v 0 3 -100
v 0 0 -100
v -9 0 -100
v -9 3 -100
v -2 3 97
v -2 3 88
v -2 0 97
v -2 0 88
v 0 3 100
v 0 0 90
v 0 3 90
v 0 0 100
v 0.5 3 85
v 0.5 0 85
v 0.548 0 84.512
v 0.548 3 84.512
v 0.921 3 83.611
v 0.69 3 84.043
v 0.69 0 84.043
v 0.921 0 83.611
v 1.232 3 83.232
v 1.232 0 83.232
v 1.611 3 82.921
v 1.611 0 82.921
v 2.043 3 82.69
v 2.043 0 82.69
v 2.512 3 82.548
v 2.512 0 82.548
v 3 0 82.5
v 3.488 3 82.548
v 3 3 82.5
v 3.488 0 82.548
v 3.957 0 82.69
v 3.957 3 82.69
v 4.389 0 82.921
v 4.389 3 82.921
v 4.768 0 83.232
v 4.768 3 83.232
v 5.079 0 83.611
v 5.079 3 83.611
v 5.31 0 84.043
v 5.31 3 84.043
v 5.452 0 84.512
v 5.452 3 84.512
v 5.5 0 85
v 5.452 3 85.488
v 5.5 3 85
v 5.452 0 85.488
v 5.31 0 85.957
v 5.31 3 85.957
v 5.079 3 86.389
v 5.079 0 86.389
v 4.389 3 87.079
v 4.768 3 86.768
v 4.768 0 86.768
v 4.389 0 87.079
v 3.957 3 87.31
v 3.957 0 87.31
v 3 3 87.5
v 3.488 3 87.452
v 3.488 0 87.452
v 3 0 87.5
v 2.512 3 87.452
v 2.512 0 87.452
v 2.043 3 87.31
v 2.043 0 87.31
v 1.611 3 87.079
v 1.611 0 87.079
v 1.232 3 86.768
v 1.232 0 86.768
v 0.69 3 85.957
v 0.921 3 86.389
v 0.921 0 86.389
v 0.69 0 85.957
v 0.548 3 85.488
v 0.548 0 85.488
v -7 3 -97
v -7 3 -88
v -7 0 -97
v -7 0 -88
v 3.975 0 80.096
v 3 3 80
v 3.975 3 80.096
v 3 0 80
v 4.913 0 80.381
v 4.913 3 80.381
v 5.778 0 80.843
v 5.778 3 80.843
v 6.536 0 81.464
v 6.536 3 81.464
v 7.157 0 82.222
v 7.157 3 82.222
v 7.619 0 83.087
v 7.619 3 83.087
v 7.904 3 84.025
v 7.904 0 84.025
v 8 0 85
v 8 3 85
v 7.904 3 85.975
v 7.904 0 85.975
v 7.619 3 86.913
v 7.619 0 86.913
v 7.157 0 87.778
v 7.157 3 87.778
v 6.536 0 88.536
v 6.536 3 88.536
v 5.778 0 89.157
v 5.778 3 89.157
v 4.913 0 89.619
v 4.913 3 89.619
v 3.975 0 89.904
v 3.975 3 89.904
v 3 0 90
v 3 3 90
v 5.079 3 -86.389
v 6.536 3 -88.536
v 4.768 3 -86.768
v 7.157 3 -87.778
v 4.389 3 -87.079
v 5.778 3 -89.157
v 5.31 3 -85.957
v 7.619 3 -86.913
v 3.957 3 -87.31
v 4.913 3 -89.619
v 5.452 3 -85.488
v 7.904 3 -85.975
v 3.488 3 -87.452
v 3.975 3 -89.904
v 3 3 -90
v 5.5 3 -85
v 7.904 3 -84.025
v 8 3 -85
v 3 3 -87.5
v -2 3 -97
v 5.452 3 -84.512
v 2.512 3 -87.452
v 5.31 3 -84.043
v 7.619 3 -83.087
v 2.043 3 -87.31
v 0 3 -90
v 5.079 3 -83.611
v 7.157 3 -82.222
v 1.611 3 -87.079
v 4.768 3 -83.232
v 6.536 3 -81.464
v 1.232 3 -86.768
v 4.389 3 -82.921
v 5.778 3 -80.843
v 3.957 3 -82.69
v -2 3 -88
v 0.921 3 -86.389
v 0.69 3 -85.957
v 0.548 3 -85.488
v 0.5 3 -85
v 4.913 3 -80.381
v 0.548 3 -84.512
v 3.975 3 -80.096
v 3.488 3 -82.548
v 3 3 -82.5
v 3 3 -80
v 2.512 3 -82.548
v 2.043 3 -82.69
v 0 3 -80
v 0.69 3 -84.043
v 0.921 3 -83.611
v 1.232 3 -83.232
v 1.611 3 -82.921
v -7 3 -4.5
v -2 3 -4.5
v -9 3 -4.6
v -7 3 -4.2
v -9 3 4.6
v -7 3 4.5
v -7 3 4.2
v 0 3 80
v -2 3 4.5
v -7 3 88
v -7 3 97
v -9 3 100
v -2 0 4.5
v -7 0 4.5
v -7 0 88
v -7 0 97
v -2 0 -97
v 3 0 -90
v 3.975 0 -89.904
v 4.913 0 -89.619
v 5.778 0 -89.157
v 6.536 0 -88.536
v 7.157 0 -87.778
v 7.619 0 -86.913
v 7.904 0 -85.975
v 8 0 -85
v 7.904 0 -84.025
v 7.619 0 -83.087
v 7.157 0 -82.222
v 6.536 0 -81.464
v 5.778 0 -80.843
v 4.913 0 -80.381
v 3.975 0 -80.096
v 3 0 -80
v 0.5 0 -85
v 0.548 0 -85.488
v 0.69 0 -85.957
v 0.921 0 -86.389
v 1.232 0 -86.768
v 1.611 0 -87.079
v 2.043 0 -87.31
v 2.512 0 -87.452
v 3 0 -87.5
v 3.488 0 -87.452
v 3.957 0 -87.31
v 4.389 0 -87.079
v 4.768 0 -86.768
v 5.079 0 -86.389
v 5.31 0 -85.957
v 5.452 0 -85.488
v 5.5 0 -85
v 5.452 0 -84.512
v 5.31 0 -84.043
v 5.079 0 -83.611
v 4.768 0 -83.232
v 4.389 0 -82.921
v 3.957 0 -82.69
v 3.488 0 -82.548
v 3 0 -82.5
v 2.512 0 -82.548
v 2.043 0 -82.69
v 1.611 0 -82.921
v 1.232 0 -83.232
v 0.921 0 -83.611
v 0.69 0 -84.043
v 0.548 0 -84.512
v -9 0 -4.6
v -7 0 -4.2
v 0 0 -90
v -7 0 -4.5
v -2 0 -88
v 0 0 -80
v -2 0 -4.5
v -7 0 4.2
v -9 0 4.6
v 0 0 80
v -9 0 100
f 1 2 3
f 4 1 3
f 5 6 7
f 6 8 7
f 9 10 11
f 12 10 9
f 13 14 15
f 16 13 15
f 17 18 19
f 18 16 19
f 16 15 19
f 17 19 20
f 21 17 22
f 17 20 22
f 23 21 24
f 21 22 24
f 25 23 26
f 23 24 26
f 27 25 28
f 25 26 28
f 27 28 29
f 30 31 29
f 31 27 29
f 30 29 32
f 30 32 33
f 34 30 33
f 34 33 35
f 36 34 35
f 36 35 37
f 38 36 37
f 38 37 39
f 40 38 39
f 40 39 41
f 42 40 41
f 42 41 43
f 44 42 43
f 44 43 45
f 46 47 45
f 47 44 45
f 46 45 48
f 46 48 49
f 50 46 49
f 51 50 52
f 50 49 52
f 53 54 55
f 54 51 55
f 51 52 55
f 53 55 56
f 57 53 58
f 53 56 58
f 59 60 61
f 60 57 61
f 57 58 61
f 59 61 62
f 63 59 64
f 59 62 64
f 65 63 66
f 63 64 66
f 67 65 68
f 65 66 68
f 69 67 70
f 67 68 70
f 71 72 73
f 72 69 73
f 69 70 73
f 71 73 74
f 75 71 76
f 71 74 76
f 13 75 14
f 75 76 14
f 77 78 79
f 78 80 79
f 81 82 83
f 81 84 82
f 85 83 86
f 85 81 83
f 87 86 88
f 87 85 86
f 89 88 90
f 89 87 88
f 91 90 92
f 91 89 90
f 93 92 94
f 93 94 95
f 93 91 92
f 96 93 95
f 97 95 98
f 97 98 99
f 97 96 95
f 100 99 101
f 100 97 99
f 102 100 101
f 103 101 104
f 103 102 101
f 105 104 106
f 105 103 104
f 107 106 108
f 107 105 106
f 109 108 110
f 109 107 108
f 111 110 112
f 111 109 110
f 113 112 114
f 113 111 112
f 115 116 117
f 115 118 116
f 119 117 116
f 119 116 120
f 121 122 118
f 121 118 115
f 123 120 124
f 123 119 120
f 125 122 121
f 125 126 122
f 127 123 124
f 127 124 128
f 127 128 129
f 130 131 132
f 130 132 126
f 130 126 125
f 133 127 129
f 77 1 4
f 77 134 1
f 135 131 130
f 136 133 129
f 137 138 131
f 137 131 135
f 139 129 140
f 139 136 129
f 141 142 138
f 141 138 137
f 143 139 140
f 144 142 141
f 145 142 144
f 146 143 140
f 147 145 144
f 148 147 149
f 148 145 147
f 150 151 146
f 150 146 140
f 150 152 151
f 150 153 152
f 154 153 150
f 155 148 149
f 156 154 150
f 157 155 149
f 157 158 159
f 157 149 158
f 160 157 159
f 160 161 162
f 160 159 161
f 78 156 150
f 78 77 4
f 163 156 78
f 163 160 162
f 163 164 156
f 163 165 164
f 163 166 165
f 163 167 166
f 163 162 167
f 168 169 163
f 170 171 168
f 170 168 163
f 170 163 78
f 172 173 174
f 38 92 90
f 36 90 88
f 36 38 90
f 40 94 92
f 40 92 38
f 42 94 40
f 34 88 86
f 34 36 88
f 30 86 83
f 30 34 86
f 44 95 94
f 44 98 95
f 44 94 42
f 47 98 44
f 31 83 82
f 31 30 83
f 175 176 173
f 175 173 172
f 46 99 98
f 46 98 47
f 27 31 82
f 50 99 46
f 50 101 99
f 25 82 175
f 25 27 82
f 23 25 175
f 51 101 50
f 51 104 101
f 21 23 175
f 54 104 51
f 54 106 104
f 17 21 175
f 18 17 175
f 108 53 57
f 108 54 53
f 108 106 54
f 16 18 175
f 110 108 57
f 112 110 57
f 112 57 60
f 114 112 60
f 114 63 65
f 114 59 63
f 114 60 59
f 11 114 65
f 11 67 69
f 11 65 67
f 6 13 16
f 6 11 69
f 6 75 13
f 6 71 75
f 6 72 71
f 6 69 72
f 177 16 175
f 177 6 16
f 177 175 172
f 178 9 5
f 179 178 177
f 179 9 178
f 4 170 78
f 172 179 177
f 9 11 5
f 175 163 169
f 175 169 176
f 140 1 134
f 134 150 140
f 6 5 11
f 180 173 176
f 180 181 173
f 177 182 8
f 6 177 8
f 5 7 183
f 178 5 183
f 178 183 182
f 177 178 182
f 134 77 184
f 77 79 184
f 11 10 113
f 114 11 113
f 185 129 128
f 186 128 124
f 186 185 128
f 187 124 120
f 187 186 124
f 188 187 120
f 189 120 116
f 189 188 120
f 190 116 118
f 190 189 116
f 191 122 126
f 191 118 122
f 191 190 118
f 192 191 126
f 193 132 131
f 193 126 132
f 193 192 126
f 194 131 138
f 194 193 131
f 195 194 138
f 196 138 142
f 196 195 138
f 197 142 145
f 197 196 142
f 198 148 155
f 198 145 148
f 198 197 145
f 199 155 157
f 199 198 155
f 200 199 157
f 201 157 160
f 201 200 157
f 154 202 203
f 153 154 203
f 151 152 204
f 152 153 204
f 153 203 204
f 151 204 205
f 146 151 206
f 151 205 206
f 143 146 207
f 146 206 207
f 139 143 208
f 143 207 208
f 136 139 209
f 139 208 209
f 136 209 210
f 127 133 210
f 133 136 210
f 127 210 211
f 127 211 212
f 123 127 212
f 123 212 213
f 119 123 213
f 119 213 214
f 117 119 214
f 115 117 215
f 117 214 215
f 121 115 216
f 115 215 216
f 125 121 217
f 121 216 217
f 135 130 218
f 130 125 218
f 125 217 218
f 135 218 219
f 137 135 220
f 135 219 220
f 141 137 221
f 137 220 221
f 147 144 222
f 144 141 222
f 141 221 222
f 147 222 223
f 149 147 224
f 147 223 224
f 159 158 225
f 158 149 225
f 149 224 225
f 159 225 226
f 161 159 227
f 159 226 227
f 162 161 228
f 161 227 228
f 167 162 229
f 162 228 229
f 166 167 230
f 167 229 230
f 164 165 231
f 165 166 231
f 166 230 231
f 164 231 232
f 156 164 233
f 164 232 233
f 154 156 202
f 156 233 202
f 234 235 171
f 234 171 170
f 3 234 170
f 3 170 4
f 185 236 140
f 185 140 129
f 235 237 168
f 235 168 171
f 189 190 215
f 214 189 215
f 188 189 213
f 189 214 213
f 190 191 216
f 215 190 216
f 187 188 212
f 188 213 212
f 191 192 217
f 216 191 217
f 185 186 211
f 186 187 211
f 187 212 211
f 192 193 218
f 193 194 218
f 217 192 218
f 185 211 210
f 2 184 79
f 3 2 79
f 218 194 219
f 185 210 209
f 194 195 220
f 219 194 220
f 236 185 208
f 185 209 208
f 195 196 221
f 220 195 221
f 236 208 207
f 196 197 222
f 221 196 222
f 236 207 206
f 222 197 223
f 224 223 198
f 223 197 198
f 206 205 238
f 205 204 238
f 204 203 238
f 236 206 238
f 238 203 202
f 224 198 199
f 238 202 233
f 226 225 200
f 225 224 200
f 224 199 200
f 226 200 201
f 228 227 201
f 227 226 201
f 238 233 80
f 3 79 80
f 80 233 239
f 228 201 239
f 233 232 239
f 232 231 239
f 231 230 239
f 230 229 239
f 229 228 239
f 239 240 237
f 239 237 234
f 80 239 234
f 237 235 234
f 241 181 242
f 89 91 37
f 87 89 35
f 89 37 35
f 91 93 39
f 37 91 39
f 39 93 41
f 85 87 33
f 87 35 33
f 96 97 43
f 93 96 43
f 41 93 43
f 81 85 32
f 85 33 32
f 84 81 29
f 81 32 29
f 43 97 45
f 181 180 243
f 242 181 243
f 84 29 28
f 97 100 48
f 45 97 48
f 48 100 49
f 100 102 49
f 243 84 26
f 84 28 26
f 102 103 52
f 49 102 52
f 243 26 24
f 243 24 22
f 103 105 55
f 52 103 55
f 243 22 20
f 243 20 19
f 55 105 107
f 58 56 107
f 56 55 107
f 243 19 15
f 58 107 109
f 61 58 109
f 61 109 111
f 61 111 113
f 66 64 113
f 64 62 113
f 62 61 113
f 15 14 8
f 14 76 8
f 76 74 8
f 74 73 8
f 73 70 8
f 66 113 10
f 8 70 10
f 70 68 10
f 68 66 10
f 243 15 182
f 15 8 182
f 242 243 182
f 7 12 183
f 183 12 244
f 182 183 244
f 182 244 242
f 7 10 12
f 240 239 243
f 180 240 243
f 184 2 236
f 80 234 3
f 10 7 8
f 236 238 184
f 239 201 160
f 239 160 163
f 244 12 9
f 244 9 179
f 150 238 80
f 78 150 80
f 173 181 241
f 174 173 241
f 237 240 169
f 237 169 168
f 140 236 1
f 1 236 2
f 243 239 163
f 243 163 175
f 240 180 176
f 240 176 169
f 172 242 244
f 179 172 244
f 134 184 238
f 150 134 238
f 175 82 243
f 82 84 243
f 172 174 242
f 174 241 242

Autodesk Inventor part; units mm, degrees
ref_plane "YZ Plane" through (0, 0, 0) normal (1, 0, 0) x (0, 1, 0)
ref_plane "XZ Plane" through (0, 0, 0) normal (0, 1, 0) x (-1, 0, 0)
ref_plane "XY Plane" through (0, 0, 0) normal (0, 0, 1) x (1, 0, 0)
sketch "草圖1" plane through (0, 0, 0) normal (0, 1, 0) x (-1, 0, 0)
  line L0 (0, 80) -> (9, 80)
  line L1 (9, -80) -> (0, -80)
  line L2 (0, -80) -> (0, 80)
  line L3 (7, 4.5) -> (2, 4.5)
  line L4 (2, 4.5) -> (2, -4.5)
  line L5 (2, -4.5) -> (7, -4.5)
  line L6 (9, 80) -> (9, 90)
  line L7 (9, 90) -> (-3, 90)
  line L8 (-8, 85) -> (-8, 85)
  line L9 (-3, 80) -> (0, 80)
  arc A0 (-8, 85) -> (-3, 80) centre (-3, 85) ccw
  arc A1 (-3, 90) -> (-8, 85) centre (-3, 85) ccw
  circle A2 centre (-3, 85) radius 2.5
  line L10 (9, 0) -> (0, 0)
  line L11 (9, -80) -> (9, -90)
  line L12 (9, -90) -> (-3, -90)
  line L13 (-3, -80) -> (0, -80)
  arc A3 (-3, -80) -> (-8, -85) centre (-3, -85) ccw
  arc A4 (-8, -85) -> (-3, -90) centre (-3, -85) ccw
  circle A5 centre (-3, -85) radius 2.5
  line L14 (9, 80) -> (9, 4.6)
  line L15 (9, -4.6) -> (9, -80)
  line L16 (7, -4.5) -> (7, -4.2)
  line L17 (7, -4.2) -> (9, -4.6)
  line L18 (7, 4.5) -> (7, 4.2)
  line L19 (7, 4.2) -> (9, 4.6)
  line L20 (9, 90) -> (0, 90)
  line L21 (0, 90) -> (0, 100)
  line L22 (0, 100) -> (9, 100)
  line L23 (9, 100) -> (9, 90)
  line L24 (9, -90) -> (0, -90)
  line L25 (0, -90) -> (0, -100)
  line L26 (0, -100) -> (9, -100)
  line L27 (9, -100) -> (9, -90)
  line L28 (2, 97) -> (7, 97)
  line L29 (7, 97) -> (7, 88)
  line L30 (7, 88) -> (2, 88)
  line L31 (2, 88) -> (2, 97)
  line L32 (7, -97) -> (2, -97)
  line L33 (2, -97) -> (2, -88)
  line L34 (2, -88) -> (7, -88)
  line L35 (7, -88) -> (7, -97)
  point P0 (4.5, 4.5)
  point P1 (4.5, 80)
  point P2 (-8, 90)
  point P3 (-8, -90)
  point P4 (2, 0)
  point P5 (4.5, 97)
  point P6 (4.5, 100)
  point P7 (4.5, -97)
  point P8 (4.5, -100)
  dimension "d0" = 160
  dimension "d1" = 9
  dimension "d3" = 5
  dimension "d4" = 10
  dimension "d5" = 17
  dimension "d6" = 5
  dimension "d7" = 5
  dimension "d8" = 5
  dimension "d13" = 9
  dimension "d14" = 0.3
  dimension "d15" = 0.3
  dimension "d17" = 0
  dimension "d18" = 5
  dimension "d21" = 17
  dimension "d22" = 10
  dimension "d23" = 9
  dimension "d24" = 9
  dimension "d25" = 10
  dimension "d26" = 9
  dimension "d27" = 5
  dimension "d28" = 3
  dimension "d29" = 9
  dimension "d30" = 5
  dimension "d31" = 3
  dimension "d32" = 75.4
  dimension "d33" = 75.4
extrude "擠出1" add sketch "草圖1" along normal blind 3 contours L9 A0 A1 L7 L31 L30 L29 L6 L0 | L0 L14 L19 L18 L3 L4 L10 L2 | L10 L4 L5 L16 L17 L15 L1 L2 | L7 L29 L28 L31 L21 L22 L23 | L1 L11 L12 L35 L34 L33 A4 A3 L13 | L27 L26 L25 L12 L33 L32 L35
properties part number "Lower_Bar" material "MDF Medium Density Fiberboard"
